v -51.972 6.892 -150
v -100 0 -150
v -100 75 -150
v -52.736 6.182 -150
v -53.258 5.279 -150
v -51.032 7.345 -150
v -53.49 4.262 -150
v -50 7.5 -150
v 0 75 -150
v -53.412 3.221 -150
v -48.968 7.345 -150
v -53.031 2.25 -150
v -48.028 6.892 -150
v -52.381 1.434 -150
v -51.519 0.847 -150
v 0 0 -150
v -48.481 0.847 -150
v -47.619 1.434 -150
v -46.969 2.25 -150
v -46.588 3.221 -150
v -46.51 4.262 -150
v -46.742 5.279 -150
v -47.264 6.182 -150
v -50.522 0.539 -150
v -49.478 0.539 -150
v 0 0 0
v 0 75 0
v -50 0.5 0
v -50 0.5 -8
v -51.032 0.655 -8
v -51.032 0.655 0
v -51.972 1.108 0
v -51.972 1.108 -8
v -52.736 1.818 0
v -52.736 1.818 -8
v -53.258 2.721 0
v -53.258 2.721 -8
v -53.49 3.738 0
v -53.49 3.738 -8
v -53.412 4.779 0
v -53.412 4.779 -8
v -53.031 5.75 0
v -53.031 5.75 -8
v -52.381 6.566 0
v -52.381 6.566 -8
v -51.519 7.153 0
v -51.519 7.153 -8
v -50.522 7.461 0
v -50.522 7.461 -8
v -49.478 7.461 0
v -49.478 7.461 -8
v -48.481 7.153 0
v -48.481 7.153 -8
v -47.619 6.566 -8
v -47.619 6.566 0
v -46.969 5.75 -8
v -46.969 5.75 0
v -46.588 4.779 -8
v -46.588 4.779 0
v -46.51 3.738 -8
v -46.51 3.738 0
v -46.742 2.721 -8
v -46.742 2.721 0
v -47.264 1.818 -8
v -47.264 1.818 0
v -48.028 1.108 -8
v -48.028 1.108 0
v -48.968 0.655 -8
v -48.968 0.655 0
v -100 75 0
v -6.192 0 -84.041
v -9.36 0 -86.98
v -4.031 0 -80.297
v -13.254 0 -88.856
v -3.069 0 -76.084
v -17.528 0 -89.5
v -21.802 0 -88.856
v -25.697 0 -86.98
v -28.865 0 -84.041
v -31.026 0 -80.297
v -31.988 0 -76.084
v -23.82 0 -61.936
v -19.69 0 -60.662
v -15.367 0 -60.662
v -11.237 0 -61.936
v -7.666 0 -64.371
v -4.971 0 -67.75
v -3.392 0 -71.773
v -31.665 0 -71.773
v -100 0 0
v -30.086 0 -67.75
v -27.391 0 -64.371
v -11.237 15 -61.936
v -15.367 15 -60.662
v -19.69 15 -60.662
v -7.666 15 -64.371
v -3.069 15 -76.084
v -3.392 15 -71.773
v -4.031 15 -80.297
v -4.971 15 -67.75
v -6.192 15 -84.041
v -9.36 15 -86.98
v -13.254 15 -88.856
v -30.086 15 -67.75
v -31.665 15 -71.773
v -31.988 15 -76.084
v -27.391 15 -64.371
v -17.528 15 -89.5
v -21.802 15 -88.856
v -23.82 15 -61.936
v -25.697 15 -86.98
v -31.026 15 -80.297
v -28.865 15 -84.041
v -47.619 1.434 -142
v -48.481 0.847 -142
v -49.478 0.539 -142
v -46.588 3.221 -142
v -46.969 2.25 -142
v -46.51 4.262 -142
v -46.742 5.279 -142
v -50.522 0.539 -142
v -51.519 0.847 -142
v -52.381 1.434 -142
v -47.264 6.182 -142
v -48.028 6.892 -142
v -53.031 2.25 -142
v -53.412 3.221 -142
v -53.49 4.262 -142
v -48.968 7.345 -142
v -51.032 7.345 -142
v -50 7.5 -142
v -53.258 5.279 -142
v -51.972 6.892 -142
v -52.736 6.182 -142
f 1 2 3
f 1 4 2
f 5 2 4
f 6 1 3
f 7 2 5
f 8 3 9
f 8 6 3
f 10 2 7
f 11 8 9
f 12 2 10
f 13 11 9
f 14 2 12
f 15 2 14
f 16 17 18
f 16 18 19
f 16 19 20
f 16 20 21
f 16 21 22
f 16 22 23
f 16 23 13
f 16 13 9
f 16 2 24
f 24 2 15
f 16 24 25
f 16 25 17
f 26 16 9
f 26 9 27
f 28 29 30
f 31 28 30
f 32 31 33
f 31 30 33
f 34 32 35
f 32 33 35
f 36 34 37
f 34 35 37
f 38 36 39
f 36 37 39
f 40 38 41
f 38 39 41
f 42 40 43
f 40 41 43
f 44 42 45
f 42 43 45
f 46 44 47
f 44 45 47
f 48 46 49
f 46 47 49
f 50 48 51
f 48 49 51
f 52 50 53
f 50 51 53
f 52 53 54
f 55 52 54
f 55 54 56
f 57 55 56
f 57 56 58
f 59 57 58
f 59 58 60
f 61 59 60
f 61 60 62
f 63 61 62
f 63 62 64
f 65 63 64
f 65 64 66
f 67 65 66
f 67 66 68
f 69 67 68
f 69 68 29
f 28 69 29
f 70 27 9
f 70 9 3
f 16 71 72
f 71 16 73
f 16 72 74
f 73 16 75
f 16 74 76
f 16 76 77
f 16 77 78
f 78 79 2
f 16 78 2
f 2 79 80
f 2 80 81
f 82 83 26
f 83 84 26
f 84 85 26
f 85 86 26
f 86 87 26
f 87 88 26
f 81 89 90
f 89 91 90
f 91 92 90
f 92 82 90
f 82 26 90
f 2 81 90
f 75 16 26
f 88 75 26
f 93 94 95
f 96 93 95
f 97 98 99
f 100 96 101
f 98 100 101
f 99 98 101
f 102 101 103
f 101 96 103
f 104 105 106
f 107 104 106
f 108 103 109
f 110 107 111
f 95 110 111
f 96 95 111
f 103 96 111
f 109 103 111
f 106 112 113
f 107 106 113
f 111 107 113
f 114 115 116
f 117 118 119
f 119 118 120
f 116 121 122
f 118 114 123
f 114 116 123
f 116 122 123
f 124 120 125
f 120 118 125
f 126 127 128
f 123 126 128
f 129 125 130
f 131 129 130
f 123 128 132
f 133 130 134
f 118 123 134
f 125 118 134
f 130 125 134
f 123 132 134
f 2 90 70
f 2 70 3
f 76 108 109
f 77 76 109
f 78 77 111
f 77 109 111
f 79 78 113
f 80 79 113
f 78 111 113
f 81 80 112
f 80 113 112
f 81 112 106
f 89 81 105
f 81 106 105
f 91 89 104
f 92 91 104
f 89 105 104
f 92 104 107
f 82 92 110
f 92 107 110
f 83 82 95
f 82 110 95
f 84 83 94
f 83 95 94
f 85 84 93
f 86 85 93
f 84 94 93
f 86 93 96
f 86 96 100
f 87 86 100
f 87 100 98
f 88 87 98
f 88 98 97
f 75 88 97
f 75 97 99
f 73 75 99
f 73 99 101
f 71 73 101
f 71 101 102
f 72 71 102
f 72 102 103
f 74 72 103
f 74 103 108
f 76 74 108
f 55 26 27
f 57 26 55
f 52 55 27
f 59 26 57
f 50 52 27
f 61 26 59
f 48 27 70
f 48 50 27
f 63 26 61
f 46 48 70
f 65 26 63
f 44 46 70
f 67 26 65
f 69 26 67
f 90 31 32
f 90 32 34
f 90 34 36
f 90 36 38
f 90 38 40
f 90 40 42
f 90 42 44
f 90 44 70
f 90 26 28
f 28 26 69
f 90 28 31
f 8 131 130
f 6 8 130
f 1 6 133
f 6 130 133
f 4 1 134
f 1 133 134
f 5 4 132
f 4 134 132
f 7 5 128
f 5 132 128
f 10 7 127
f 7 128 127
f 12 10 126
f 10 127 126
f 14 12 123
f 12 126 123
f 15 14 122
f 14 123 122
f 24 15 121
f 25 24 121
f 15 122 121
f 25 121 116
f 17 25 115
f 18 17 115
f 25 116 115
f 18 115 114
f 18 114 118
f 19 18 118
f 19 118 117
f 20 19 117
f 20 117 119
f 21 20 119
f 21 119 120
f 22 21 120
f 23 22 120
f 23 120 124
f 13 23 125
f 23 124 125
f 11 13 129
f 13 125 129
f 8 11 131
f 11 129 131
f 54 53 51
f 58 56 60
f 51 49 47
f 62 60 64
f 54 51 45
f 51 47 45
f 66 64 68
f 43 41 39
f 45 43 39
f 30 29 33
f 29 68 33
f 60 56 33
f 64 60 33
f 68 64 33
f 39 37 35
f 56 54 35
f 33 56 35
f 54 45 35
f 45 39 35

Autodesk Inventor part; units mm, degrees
ref_plane "YZ Plane" through (0, 0, 0) normal (1, 0, 0) x (0, 1, 0)
ref_plane "XZ Plane" through (0, 0, 0) normal (0, 1, 0) x (-1, 0, 0)
ref_plane "XY Plane" through (0, 0, 0) normal (0, 0, 1) x (1, 0, 0)
sketch "Sketch1" plane through (0, 0, 0) normal (0, 1, 0) x (-1, 0, 0)
  line L0 (0, 0) -> (100, 0)
  line L1 (100, 0) -> (100, -150)
  line L2 (100, -150) -> (0, -150)
  line L3 (0, -150) -> (0, 0)
  dimension "d0" = 100
  dimension "d1" = 150
extrude "Extrusion1" add sketch "Sketch1" along normal blind 75
sketch "Sketch2" plane through (0, 0, -150) normal (0, 0, -1) x (-1, 0, 0)
  line L0 (0, 0) -> (100, 0) projected
  circle A0 centre (50, 4) radius 3.5
hole "Hole1" at (-50, 4, -150) direction (0, 0, 1) diameter 7 depth 8
sketch "Sketch3" plane through (-100, 0, 0) normal (0, 0, 1) x (1, 0, 0)
  circle A0 centre (50, 4) radius 3.5 projected
  circle A1 centre (50, 4) radius 3.5
  point P0 (100, 0)
hole "Hole2" at (-50, 4, 0) direction (0, 0, -1) diameter 7 depth 8
sketch "Sketch4" plane through (0, 0, 0) normal (0, -1, 0) x (1, 0, 0)
  point P0 (0, 0)
sketch "Sketch5" plane through (0, 0, 0) normal (0, -1, 0) x (1, 0, 0)
  line L0 (0, 0) -> (0, -150) projected
  line L1 (0, -75) -> (-100, -75)
  line L2 (-100, -150) -> (-100, 0) projected
sketch "Sketch6" plane through (0, 0, 0) normal (0, -1, 0) x (1, 0, 0)
  circle A0 centre (-17.5284, -75) radius 15
  point P0 (0, 0)
  dimension "d20" = 30
hole "Hole3" at (-17.5284, 0, -75) direction (0, 1, 0) diameter 29 depth 15
properties part number "Box 1"
